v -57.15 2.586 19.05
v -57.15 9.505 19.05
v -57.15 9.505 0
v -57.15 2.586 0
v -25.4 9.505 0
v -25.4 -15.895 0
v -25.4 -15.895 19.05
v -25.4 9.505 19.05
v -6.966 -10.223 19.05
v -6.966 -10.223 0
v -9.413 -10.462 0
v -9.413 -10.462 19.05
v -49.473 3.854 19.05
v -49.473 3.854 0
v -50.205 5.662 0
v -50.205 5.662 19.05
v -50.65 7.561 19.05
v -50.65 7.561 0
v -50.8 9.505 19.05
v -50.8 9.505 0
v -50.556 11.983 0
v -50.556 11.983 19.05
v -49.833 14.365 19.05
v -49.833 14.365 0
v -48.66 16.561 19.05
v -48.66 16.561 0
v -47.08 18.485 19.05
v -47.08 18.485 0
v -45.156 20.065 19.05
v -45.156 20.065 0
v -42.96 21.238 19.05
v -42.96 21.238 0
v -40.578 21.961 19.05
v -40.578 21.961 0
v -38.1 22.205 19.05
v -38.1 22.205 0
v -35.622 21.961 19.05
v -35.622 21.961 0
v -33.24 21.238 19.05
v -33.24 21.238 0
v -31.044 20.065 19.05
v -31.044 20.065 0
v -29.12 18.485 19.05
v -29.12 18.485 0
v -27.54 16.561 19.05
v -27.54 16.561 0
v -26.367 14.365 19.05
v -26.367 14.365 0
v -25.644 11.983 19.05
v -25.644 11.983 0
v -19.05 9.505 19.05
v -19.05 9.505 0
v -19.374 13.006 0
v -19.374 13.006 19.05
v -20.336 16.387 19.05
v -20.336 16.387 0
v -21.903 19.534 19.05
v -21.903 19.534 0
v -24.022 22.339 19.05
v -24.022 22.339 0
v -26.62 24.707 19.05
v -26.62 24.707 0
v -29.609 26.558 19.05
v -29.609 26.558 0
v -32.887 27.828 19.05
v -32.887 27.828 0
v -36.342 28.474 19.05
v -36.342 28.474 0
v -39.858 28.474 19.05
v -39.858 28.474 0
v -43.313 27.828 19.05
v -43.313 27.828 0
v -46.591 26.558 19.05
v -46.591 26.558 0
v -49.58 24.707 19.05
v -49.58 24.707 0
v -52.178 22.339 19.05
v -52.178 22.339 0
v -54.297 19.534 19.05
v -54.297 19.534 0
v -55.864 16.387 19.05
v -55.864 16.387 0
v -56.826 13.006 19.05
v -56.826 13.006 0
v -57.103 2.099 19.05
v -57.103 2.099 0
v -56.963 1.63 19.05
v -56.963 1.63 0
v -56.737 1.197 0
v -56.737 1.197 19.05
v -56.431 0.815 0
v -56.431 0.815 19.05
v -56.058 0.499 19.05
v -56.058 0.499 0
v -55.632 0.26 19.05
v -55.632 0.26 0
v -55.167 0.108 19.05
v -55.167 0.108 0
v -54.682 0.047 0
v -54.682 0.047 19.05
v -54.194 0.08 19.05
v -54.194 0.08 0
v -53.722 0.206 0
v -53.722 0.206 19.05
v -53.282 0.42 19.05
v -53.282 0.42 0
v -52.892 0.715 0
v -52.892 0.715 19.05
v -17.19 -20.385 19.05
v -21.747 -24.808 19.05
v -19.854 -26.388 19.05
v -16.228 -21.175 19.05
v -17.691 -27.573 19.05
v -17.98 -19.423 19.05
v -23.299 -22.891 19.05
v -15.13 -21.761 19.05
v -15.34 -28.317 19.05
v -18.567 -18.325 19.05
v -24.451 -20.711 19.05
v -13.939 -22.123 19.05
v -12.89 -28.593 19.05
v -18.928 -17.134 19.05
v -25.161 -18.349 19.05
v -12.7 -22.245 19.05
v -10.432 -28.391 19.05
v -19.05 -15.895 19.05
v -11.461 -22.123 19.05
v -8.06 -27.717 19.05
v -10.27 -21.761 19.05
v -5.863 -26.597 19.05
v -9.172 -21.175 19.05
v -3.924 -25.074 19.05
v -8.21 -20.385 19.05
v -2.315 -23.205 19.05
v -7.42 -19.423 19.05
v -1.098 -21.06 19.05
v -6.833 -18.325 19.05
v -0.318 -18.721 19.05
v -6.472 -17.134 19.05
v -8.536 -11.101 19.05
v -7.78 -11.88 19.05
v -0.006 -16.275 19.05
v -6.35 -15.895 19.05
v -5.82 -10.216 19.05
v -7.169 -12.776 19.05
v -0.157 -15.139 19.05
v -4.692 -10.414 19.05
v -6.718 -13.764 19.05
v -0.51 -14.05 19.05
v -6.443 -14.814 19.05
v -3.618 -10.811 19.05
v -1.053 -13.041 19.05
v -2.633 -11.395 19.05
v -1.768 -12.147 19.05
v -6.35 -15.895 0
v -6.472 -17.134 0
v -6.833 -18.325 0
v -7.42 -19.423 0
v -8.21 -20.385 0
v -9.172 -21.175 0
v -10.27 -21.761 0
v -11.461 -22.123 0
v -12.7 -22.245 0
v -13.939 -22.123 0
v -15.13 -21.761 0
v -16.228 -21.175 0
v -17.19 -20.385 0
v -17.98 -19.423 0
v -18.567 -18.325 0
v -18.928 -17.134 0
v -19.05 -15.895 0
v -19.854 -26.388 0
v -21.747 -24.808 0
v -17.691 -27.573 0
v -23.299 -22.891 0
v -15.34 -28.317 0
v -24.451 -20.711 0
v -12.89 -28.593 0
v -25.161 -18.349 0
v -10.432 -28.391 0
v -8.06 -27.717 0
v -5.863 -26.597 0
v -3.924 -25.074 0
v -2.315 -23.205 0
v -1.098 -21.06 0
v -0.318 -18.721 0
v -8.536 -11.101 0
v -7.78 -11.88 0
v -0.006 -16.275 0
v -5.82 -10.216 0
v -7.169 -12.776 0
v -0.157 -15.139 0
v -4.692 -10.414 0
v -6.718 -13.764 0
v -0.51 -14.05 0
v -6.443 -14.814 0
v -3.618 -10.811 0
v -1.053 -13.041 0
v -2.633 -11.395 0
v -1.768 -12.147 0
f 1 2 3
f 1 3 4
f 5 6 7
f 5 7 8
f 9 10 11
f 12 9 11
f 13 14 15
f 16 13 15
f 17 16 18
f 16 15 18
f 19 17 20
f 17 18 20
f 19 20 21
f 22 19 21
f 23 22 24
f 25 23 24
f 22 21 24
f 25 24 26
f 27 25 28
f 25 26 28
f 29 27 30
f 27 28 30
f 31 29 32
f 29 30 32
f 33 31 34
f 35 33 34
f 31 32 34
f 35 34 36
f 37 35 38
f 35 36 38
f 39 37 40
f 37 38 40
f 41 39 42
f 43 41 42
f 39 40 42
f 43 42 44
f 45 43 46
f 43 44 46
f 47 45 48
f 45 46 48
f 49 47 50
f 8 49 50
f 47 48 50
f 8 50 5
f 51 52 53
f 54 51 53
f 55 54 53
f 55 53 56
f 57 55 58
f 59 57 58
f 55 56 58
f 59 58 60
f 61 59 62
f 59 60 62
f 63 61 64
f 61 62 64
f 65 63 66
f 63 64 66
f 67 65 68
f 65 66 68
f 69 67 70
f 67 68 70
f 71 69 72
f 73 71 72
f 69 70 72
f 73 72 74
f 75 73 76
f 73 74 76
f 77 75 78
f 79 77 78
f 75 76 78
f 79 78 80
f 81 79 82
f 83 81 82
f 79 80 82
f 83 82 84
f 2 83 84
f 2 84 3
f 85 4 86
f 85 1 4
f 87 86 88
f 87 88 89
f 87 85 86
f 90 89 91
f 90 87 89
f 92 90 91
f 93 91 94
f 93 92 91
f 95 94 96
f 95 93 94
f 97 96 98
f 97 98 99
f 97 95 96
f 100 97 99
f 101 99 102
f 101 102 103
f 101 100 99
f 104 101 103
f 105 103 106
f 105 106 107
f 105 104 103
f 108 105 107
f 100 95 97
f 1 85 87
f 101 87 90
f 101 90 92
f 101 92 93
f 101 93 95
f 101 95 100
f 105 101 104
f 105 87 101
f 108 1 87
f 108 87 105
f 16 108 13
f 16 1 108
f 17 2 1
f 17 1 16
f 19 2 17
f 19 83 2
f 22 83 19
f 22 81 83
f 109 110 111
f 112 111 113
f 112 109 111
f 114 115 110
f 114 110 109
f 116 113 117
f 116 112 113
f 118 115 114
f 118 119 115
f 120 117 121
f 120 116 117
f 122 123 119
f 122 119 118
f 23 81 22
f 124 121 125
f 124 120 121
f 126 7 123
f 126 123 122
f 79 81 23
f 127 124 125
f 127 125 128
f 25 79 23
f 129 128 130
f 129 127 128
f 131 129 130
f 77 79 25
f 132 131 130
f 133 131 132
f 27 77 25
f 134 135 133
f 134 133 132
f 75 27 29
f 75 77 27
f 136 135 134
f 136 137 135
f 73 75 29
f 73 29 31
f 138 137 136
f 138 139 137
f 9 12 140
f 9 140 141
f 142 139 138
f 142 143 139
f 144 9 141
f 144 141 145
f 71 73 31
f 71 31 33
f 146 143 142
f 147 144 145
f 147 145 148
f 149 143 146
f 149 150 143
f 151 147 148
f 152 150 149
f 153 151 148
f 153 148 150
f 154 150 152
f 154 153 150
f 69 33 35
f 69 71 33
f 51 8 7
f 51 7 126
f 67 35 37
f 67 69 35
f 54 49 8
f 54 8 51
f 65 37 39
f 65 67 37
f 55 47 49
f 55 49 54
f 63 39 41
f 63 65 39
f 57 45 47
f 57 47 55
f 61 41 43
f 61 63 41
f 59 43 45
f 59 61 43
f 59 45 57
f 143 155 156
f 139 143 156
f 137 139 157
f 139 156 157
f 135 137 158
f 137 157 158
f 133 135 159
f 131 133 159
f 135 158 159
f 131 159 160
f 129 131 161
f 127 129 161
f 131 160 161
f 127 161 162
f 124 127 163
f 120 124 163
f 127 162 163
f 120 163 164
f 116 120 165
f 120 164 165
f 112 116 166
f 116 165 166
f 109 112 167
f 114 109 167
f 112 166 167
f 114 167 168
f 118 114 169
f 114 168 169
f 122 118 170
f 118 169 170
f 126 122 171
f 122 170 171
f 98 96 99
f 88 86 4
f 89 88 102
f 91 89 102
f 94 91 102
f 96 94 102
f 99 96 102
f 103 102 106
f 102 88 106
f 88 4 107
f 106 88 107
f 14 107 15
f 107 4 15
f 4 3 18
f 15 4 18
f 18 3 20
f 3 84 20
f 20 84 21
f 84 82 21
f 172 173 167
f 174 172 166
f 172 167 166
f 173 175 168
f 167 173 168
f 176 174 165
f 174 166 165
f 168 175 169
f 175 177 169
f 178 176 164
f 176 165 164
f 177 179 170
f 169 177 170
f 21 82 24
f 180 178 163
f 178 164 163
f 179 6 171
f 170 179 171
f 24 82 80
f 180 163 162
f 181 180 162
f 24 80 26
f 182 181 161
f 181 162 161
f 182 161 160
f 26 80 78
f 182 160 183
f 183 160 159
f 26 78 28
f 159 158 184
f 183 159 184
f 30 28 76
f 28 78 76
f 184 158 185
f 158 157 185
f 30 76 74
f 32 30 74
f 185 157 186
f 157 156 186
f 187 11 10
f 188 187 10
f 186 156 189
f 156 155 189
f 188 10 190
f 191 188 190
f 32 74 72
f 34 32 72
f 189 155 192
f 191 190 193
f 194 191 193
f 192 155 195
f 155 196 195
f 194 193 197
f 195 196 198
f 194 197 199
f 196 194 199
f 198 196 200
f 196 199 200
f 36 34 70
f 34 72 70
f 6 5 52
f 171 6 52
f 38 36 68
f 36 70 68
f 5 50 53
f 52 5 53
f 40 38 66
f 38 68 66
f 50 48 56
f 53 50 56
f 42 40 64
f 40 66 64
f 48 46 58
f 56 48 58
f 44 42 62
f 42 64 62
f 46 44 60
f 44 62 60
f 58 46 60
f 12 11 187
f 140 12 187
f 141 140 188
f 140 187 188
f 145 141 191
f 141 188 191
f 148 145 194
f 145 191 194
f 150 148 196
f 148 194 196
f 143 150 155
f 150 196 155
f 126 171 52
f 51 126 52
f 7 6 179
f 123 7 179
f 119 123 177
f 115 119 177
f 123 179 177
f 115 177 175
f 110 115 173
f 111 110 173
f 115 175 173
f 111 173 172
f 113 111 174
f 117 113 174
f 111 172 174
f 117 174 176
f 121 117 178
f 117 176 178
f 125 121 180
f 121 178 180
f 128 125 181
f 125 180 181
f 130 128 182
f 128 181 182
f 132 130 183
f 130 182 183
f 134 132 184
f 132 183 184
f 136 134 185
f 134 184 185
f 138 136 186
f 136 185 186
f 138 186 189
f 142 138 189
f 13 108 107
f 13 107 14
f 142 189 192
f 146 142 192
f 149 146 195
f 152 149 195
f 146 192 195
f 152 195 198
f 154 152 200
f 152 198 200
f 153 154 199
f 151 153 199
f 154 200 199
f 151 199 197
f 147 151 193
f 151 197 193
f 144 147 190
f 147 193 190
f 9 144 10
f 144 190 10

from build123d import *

# Parameters (mm, degrees)
F0_W     = 6.35
F0_H     = 25.4
F1_DEPTH = 19.05
F2_R     = 2.54


with BuildPart() as f1:
    # F0 (on Top) → F1 (new body)
    with BuildSketch(Plane.XY):
        with BuildLine():
            ThreePointArc((-50.8, 9.50515), (-38.1, 22.20515), (-25.4, 9.50515))
            Line((-25.4, 9.50515), (-19.05, 9.50515))
            ThreePointArc((-19.05, 9.50515), (-38.1, 28.55515), (-57.15, 9.50515))
            Line((-57.15, 9.50515), (-57.15, -3.19485))
            Line((-57.15, -3.19485), (-49.473359, 3.853894))
            ThreePointArc((-49.473359, 3.853894), (-50.463892, 6.602709), (-50.8, 9.50515))
        make_face()
        with Locations((-22.225, -3.19485)):
            Rectangle(F0_W, F0_H)
        with BuildLine():
            Line((-19.05, -15.89485), (-25.4, -15.89485))
            ThreePointArc((-25.4, -15.89485), (-12.88999, -28.593429), (-0.005684, -16.274787))
            ThreePointArc((-0.005684, -16.274787), (-2.183514, -11.751451), (-6.965598, -10.223322))
            Line((-6.965598, -10.223322), (-9.413118, -10.461719))
            ThreePointArc((-9.413118, -10.461719), (-7.168536, -12.776292), (-6.35, -15.89485))
            ThreePointArc((-6.35, -15.89485), (-12.7, -22.24485), (-19.05, -15.89485))
        make_face()
    extrude(amount=F1_DEPTH)

    # F2
    f2_edges = [f1.edges().sort_by_distance(p)[0] for p in [
        (-57.15, -3.19485, 9.525),
    ]]
    fillet(f2_edges, radius=F2_R)


solid = f1.part
